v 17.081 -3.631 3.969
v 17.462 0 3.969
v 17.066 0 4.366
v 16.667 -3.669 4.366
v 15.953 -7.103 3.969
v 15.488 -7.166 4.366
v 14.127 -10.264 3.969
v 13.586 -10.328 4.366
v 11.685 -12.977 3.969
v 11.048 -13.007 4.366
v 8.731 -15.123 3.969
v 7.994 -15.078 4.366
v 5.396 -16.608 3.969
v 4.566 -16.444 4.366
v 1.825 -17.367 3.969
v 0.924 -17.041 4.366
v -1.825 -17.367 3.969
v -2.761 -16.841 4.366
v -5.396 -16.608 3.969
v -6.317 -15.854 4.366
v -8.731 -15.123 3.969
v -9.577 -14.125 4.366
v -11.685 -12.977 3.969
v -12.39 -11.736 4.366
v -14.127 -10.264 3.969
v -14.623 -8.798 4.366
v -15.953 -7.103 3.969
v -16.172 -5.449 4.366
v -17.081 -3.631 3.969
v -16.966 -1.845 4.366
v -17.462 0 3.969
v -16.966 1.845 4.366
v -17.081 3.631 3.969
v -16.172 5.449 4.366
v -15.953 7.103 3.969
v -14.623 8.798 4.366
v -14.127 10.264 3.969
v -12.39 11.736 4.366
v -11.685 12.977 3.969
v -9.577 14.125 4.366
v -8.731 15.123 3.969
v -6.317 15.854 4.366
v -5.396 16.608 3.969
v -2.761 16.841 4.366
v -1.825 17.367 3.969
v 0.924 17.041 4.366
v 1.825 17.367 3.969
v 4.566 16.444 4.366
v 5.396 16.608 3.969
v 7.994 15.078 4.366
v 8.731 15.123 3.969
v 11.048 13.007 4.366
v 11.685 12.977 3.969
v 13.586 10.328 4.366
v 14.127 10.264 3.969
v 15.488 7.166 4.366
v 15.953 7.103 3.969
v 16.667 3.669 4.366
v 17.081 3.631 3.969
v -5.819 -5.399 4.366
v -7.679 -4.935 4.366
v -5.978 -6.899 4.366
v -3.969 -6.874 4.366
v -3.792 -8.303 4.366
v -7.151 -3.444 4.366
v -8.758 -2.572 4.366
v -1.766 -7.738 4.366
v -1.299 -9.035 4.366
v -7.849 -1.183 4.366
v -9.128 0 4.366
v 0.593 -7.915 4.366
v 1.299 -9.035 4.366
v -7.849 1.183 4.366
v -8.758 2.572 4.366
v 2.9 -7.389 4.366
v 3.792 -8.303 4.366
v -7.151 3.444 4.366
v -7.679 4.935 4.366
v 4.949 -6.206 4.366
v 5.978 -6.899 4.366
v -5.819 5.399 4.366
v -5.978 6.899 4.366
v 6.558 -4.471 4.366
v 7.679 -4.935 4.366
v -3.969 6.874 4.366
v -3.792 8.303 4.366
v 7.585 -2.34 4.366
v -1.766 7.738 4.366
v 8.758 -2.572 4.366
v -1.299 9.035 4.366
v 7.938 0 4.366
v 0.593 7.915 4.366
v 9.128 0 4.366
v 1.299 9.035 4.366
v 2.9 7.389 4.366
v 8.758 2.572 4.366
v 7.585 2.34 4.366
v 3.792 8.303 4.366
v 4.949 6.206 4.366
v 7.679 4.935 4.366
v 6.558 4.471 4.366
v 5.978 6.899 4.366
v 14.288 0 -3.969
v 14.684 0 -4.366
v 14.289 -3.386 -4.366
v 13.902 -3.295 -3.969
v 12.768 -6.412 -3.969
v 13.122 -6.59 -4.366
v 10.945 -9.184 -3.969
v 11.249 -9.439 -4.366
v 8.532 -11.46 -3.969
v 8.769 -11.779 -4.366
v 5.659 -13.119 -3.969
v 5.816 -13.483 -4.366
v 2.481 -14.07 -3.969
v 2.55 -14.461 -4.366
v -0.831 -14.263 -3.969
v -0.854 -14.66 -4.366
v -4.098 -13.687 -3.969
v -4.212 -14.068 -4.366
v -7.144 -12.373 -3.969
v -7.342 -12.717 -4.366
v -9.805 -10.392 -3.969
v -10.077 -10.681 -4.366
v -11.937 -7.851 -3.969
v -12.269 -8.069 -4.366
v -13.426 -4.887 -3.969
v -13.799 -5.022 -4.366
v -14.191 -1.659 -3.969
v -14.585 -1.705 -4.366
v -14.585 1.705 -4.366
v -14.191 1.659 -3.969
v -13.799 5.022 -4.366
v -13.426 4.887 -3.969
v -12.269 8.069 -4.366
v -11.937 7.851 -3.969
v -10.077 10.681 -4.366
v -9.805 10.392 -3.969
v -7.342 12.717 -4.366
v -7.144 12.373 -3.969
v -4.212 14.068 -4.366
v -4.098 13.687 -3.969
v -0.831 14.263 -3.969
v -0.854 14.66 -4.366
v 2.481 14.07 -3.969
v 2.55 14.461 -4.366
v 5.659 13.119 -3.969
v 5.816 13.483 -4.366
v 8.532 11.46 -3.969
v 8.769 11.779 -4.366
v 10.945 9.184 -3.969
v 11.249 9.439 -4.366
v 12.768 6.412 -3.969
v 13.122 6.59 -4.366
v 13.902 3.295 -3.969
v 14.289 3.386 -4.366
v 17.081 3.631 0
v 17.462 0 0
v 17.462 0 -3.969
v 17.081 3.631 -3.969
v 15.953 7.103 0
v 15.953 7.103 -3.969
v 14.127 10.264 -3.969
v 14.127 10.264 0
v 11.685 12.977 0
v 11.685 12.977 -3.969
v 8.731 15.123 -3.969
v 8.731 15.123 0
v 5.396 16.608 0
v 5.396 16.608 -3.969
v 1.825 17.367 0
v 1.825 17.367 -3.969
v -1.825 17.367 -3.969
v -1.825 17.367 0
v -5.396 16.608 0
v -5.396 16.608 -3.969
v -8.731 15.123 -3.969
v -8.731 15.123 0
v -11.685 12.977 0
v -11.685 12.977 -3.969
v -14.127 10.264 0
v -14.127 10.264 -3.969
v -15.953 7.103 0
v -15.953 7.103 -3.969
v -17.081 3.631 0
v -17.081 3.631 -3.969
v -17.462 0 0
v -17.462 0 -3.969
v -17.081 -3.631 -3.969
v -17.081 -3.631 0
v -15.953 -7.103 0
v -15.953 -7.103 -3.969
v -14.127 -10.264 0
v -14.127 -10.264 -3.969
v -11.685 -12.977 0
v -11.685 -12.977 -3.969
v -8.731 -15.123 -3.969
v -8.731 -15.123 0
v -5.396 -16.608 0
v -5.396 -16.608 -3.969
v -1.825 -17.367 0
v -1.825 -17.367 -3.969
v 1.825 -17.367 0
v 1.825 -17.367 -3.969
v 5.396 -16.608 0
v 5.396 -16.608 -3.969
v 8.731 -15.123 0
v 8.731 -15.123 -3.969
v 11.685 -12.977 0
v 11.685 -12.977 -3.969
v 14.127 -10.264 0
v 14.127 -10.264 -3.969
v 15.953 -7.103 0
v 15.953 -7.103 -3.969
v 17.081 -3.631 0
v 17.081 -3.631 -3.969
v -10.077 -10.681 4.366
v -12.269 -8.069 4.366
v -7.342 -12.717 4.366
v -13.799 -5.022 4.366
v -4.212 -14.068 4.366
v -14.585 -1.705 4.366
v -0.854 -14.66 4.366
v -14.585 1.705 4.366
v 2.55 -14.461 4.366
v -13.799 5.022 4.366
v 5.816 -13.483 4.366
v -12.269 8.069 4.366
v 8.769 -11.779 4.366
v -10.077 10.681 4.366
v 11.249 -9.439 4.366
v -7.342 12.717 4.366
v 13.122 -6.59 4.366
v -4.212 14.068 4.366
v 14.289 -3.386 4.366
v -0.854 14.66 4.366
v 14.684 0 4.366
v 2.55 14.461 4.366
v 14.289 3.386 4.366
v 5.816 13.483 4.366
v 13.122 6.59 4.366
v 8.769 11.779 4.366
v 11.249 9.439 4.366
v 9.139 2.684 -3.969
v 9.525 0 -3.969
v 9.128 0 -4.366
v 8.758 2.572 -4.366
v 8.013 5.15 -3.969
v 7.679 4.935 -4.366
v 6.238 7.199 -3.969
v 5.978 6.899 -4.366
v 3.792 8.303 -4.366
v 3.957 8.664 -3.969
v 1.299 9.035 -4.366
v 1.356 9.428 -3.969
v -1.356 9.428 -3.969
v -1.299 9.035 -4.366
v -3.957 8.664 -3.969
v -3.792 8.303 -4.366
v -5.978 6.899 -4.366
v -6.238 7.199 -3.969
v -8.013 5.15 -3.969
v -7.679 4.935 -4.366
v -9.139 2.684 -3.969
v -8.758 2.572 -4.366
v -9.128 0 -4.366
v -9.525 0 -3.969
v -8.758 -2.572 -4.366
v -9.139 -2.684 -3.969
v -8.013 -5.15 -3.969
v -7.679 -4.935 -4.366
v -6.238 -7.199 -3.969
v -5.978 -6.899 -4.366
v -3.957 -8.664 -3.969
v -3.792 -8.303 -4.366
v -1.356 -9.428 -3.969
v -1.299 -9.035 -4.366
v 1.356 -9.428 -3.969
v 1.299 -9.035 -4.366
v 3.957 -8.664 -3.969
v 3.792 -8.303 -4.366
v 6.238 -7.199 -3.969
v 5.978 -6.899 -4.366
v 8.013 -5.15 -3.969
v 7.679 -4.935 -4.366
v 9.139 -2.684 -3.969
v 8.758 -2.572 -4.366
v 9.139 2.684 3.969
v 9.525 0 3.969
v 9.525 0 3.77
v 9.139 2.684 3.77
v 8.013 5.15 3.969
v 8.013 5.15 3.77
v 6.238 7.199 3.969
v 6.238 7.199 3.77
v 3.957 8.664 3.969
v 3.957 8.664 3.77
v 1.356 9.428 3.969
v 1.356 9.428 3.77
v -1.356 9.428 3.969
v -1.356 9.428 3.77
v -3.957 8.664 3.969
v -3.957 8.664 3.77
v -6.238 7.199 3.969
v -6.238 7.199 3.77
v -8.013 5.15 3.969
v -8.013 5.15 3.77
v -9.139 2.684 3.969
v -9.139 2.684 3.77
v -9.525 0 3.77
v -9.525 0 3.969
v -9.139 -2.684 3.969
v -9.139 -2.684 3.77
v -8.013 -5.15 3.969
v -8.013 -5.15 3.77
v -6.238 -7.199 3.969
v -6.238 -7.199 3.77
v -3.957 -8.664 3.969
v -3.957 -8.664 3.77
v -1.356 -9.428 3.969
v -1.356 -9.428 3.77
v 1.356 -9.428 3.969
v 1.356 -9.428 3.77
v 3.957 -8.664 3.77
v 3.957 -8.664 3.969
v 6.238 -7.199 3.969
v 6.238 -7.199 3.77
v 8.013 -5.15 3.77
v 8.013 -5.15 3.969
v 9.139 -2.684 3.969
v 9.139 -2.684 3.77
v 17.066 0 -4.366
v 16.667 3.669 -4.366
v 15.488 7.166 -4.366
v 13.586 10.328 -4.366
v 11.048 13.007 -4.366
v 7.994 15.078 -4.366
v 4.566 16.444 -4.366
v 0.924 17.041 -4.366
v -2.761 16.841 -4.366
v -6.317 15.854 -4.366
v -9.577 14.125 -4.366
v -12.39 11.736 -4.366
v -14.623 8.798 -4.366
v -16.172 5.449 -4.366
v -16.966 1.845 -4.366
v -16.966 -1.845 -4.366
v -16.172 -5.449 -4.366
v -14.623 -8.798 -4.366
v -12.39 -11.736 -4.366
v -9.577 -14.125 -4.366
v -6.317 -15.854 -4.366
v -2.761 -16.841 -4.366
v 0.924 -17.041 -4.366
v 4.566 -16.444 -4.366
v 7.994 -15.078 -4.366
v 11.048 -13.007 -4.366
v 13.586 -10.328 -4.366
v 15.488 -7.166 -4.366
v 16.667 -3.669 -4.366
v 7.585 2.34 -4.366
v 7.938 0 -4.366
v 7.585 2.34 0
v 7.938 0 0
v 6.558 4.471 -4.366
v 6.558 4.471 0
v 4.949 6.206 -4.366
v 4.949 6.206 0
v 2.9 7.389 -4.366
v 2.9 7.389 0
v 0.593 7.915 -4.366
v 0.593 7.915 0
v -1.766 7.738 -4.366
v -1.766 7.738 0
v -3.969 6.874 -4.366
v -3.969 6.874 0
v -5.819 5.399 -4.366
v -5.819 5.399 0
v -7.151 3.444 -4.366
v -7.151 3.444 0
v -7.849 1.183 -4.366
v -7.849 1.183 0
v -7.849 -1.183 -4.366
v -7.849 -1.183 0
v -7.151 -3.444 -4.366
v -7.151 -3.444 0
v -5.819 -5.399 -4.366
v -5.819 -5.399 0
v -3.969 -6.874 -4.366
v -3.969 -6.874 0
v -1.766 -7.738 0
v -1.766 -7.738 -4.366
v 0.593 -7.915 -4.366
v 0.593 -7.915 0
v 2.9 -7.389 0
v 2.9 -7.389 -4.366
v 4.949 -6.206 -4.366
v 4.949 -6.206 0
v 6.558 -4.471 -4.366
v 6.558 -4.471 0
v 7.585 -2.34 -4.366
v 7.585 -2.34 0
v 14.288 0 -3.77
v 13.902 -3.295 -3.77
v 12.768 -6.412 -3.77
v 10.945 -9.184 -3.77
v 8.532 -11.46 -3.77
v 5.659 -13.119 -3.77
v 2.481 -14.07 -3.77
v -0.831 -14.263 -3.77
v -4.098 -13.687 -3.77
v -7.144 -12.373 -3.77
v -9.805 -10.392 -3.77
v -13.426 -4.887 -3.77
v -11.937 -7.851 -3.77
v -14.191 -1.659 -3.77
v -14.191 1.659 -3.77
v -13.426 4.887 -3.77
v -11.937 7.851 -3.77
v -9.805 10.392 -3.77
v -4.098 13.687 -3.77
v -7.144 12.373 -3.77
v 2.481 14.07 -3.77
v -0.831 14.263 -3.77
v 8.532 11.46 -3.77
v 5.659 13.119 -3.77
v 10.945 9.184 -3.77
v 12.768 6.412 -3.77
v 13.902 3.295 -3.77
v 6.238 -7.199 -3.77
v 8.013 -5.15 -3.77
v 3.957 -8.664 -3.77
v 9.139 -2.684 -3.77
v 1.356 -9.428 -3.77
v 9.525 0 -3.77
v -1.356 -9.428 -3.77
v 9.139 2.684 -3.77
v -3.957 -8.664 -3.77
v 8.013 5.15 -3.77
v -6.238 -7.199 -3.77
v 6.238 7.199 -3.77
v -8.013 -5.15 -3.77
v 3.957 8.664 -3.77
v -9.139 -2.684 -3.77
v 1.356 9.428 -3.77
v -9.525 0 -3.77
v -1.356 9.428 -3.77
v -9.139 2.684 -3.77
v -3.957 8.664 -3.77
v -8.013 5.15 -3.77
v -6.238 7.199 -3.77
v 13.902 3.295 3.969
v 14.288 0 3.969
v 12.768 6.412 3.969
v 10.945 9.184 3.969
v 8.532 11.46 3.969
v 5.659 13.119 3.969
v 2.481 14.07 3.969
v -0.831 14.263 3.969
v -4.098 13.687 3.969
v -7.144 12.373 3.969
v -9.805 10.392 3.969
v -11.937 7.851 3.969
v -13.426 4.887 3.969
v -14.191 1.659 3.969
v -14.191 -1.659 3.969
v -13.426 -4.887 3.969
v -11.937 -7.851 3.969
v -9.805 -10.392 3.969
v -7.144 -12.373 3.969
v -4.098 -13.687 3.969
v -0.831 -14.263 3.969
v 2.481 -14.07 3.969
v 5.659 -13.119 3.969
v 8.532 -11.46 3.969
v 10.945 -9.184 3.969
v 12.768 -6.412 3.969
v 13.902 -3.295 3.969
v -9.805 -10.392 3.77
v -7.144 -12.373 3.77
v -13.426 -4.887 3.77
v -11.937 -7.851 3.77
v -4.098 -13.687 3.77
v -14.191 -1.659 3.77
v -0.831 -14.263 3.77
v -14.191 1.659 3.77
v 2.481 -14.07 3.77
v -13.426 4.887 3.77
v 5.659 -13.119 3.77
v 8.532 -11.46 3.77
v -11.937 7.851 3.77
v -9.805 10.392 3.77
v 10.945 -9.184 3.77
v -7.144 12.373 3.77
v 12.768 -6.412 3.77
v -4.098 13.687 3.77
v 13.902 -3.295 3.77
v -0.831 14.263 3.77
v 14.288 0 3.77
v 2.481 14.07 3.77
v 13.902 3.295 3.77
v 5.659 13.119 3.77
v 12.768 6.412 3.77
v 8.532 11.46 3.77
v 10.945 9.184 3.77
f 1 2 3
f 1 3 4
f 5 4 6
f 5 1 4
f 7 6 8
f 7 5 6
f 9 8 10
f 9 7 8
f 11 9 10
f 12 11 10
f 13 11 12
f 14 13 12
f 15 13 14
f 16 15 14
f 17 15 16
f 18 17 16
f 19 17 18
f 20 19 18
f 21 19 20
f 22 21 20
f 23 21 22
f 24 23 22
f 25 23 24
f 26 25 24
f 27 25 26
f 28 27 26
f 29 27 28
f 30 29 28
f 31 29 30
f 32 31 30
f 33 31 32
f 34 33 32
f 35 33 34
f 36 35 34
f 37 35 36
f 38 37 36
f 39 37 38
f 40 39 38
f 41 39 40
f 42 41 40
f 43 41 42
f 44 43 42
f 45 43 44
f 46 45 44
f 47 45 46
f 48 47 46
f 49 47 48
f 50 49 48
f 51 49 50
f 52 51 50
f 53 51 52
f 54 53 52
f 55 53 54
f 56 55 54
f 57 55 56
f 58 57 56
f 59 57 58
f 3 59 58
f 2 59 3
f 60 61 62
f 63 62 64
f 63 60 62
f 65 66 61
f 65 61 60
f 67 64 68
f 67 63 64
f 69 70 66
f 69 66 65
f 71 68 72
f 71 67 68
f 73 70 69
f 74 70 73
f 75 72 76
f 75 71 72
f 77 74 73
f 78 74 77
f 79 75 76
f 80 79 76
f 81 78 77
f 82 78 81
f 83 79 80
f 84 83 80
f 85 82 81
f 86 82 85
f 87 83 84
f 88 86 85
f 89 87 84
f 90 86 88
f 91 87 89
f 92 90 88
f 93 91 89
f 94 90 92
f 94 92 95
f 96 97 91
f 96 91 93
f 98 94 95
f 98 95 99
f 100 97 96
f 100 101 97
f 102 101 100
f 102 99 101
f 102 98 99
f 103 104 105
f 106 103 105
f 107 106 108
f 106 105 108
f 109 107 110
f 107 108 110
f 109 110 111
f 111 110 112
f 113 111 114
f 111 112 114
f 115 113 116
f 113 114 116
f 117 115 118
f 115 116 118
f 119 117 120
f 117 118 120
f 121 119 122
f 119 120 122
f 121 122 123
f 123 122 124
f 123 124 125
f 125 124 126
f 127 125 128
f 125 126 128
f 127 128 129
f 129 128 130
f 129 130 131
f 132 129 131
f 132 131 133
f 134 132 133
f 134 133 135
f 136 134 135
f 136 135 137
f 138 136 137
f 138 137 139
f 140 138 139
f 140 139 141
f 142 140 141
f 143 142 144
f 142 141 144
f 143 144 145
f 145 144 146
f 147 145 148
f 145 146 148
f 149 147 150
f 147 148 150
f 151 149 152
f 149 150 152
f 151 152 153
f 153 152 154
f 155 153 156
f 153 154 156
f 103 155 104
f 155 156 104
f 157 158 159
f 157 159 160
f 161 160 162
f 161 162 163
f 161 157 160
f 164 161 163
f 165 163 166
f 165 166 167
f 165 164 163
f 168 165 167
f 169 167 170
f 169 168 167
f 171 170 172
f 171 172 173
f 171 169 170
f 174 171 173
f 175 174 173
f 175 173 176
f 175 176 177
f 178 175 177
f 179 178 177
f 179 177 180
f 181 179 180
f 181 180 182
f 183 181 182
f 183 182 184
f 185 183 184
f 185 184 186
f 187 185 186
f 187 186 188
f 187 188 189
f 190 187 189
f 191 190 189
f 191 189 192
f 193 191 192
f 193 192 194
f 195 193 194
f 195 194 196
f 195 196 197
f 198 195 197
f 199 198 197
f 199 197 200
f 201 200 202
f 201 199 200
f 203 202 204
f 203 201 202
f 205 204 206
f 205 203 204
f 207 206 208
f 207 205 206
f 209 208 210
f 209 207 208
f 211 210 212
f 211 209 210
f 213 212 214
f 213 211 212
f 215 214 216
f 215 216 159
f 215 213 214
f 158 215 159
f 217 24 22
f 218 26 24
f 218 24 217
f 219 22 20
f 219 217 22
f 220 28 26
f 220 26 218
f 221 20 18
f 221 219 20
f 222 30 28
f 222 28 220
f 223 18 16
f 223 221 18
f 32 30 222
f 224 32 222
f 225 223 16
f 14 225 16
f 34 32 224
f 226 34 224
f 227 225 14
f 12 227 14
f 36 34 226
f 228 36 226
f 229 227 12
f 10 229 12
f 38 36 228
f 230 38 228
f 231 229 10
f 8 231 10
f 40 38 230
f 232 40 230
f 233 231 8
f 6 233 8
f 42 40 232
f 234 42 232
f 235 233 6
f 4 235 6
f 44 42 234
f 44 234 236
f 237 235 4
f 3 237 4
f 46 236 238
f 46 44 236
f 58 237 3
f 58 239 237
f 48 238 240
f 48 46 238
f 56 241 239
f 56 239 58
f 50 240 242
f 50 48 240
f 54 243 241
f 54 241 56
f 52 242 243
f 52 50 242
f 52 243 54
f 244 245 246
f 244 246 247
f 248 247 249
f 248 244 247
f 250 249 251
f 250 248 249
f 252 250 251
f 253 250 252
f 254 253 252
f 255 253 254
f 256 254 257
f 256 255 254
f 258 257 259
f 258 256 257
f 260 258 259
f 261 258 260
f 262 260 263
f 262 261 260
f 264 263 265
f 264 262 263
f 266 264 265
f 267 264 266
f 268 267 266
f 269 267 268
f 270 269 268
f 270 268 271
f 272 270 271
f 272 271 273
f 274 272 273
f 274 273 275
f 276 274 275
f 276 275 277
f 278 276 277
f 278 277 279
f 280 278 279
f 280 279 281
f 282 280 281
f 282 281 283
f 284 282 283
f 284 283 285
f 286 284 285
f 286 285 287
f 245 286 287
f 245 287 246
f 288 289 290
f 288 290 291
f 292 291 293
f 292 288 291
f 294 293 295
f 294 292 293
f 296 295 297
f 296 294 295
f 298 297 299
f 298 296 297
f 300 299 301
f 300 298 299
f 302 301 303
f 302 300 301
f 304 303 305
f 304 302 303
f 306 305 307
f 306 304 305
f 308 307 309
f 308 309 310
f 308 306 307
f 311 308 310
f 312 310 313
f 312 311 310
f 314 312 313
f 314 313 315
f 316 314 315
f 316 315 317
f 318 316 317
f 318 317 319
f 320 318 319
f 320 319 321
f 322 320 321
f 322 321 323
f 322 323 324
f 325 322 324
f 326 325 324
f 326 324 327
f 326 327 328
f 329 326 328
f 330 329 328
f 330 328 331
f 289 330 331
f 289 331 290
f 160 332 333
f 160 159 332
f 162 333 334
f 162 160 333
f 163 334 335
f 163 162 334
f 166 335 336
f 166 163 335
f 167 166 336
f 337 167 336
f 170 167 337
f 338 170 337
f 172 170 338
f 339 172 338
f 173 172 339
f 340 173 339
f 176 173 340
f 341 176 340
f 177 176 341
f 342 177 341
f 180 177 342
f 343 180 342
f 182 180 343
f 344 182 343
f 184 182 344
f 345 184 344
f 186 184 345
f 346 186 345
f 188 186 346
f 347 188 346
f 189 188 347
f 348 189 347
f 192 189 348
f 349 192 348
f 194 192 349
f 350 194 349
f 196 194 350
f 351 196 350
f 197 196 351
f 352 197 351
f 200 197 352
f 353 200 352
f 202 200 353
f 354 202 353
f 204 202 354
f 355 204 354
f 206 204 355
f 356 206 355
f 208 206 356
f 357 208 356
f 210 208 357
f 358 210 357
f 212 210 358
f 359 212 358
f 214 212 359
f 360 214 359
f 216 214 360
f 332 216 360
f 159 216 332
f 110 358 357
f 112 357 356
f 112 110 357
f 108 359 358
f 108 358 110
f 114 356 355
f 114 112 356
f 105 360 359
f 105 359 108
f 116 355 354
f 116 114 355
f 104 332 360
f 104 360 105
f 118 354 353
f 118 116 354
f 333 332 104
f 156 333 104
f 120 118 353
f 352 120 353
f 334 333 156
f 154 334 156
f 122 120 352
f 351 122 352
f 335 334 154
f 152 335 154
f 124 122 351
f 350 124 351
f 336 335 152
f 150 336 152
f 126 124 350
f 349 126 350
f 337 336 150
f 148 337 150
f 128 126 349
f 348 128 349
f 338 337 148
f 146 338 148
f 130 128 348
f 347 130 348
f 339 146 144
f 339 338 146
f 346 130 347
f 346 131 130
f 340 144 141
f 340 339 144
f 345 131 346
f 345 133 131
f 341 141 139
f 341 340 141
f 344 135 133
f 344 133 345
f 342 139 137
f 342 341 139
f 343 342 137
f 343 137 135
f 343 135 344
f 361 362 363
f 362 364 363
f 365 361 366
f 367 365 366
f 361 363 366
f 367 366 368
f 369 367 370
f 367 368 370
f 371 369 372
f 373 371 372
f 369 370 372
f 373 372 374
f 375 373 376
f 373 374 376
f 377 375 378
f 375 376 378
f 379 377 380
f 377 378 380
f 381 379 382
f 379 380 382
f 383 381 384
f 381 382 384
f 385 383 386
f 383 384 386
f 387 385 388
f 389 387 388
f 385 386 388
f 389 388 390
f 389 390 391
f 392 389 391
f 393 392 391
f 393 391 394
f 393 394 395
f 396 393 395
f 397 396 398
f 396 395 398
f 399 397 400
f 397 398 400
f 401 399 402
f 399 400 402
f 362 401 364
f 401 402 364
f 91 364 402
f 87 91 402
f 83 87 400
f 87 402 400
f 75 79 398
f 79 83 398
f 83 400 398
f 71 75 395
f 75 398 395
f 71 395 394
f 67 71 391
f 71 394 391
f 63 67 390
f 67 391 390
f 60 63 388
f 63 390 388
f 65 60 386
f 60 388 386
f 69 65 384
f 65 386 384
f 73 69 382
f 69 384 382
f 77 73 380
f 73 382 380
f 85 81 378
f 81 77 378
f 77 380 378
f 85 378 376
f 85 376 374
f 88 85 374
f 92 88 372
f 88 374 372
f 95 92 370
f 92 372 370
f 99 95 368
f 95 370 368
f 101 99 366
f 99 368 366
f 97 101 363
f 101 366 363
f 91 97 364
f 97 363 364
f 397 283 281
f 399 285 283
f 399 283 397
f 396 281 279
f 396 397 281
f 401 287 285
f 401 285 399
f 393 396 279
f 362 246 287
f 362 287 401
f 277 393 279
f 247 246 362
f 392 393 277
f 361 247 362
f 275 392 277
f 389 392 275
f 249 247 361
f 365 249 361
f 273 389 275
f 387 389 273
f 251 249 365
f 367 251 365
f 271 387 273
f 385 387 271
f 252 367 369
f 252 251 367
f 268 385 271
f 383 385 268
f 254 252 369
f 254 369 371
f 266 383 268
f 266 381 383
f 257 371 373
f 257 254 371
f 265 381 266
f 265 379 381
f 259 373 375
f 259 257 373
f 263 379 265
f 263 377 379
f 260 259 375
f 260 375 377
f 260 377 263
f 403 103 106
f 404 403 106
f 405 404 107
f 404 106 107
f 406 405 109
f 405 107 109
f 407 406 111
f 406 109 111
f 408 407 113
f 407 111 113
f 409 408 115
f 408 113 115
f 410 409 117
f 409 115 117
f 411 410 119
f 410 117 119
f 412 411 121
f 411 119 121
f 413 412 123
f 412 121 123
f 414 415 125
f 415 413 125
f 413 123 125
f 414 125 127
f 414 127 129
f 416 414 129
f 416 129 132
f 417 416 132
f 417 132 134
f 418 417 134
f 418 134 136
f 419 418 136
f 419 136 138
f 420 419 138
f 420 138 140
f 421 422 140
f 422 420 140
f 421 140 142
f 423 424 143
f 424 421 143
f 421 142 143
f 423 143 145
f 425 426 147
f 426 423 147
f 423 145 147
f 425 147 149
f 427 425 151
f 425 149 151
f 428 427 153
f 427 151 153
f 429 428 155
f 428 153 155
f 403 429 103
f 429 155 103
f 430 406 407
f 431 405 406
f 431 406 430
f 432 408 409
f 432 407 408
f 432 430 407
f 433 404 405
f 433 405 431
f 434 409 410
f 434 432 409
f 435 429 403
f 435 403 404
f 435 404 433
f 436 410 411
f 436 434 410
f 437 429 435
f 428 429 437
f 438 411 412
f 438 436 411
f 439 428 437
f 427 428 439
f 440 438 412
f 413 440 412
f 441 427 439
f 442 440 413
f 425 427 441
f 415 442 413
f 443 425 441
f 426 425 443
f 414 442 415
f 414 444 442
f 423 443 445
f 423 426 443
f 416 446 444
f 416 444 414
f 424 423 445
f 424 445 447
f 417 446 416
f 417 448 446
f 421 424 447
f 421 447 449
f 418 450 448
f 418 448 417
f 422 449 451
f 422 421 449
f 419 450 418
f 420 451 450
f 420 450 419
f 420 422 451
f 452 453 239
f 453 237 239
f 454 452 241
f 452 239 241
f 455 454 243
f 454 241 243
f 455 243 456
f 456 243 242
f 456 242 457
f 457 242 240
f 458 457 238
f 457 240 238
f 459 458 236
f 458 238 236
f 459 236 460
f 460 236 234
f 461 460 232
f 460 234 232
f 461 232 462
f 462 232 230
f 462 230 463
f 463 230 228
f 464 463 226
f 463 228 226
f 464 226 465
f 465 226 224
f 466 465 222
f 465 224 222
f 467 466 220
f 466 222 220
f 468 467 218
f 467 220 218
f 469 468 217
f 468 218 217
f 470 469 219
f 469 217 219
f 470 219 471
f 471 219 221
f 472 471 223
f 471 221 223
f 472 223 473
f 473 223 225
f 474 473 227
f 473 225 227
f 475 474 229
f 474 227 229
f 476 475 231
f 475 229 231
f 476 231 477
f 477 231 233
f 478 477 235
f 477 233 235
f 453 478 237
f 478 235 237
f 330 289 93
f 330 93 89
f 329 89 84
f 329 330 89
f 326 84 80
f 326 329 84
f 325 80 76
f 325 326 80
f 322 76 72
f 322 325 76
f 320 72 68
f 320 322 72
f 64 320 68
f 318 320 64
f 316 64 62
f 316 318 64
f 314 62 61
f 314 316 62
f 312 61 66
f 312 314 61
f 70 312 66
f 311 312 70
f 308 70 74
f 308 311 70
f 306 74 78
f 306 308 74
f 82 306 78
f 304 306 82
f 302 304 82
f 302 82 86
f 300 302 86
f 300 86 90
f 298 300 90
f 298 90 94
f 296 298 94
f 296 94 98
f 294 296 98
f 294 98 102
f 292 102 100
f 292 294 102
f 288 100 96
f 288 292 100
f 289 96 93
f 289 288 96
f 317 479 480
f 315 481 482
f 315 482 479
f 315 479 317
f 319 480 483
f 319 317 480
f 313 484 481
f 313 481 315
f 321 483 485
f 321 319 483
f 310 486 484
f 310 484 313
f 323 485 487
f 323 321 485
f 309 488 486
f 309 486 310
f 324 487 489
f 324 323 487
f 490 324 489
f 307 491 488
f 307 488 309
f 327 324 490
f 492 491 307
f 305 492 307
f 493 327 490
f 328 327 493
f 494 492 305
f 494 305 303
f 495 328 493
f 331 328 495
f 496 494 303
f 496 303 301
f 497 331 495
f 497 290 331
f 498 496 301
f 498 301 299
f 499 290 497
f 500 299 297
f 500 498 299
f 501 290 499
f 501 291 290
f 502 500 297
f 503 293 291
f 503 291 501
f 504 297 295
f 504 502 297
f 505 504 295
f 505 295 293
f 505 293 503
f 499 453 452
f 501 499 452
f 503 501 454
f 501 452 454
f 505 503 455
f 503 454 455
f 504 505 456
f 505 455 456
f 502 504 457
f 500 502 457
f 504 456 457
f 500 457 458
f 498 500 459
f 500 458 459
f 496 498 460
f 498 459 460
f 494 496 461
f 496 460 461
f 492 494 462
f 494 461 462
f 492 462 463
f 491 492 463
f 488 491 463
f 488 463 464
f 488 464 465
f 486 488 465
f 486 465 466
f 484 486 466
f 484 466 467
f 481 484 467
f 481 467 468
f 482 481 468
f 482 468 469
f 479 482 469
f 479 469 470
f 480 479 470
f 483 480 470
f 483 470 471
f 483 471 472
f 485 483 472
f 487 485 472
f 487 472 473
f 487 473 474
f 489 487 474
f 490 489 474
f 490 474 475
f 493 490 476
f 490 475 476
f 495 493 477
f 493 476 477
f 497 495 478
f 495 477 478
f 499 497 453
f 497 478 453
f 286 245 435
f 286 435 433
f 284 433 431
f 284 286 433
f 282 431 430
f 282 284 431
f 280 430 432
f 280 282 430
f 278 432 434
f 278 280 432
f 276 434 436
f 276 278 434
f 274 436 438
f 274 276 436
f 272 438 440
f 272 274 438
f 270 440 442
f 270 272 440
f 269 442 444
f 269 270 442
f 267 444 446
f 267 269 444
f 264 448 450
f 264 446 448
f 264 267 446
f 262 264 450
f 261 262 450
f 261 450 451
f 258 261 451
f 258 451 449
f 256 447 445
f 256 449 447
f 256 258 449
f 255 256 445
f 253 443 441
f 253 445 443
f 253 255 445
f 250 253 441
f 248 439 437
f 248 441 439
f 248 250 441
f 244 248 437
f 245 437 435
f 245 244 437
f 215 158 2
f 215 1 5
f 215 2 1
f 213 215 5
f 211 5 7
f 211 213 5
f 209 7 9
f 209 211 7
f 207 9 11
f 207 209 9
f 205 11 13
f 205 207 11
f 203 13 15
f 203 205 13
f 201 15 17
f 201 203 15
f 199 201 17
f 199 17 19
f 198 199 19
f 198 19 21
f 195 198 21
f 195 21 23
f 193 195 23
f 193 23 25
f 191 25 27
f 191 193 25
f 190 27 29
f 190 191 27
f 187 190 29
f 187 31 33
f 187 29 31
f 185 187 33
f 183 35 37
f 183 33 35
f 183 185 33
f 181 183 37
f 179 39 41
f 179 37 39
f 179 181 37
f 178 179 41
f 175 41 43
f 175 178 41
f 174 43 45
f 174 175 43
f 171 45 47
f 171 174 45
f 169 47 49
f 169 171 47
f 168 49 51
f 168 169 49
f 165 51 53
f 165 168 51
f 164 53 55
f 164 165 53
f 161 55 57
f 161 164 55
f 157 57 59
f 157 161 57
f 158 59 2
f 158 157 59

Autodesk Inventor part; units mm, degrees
ref_plane "YZ Plane" through (0, 0, 0) normal (1, 0, 0) x (0, 1, 0)
ref_plane "XZ Plane" through (0, 0, 0) normal (0, 1, 0) x (-1, 0, 0)
ref_plane "XY Plane" through (0, 0, 0) normal (0, 0, 1) x (1, 0, 0)
sketch "Sketch1" plane through (0, 0, 0) normal (0, 0, 1) x (1, 0, 0)
  circle A0 centre (0, 0) radius 17.4625
  circle A1 centre (0, 0) radius 7.9375
  dimension "d0" = 34.925
  dimension "d2" = 15.875
extrude "Extrusion1" add sketch "Sketch1" along normal blind 4.3656
sketch "Sketch2" plane through (0, 0, 4.3656) normal (0, 0, 1) x (1, 0, 0)
  circle A0 centre (0, 0) radius 17.4625 projected
  circle A1 centre (0, 0) radius 9.525
  circle A2 centre (0, 0) radius 14.2875
  dimension "d5" = 19.05
  dimension "d8" = 28.575
extrude "Extrusion2" cut sketch "Sketch2" against normal blind 0.5953 contours A2
chamfer "Chamfer1" distance 0.3969 angle 45 3 edges at (-17.4625, 0, 4.3656) (-9.525, 0, 4.3656) (-14.2875, 0, 4.3656)
mirror "Mirror1" about plane through (0, 0, 0) normal (0, 0, -1)
properties part number "R10-2RS"
